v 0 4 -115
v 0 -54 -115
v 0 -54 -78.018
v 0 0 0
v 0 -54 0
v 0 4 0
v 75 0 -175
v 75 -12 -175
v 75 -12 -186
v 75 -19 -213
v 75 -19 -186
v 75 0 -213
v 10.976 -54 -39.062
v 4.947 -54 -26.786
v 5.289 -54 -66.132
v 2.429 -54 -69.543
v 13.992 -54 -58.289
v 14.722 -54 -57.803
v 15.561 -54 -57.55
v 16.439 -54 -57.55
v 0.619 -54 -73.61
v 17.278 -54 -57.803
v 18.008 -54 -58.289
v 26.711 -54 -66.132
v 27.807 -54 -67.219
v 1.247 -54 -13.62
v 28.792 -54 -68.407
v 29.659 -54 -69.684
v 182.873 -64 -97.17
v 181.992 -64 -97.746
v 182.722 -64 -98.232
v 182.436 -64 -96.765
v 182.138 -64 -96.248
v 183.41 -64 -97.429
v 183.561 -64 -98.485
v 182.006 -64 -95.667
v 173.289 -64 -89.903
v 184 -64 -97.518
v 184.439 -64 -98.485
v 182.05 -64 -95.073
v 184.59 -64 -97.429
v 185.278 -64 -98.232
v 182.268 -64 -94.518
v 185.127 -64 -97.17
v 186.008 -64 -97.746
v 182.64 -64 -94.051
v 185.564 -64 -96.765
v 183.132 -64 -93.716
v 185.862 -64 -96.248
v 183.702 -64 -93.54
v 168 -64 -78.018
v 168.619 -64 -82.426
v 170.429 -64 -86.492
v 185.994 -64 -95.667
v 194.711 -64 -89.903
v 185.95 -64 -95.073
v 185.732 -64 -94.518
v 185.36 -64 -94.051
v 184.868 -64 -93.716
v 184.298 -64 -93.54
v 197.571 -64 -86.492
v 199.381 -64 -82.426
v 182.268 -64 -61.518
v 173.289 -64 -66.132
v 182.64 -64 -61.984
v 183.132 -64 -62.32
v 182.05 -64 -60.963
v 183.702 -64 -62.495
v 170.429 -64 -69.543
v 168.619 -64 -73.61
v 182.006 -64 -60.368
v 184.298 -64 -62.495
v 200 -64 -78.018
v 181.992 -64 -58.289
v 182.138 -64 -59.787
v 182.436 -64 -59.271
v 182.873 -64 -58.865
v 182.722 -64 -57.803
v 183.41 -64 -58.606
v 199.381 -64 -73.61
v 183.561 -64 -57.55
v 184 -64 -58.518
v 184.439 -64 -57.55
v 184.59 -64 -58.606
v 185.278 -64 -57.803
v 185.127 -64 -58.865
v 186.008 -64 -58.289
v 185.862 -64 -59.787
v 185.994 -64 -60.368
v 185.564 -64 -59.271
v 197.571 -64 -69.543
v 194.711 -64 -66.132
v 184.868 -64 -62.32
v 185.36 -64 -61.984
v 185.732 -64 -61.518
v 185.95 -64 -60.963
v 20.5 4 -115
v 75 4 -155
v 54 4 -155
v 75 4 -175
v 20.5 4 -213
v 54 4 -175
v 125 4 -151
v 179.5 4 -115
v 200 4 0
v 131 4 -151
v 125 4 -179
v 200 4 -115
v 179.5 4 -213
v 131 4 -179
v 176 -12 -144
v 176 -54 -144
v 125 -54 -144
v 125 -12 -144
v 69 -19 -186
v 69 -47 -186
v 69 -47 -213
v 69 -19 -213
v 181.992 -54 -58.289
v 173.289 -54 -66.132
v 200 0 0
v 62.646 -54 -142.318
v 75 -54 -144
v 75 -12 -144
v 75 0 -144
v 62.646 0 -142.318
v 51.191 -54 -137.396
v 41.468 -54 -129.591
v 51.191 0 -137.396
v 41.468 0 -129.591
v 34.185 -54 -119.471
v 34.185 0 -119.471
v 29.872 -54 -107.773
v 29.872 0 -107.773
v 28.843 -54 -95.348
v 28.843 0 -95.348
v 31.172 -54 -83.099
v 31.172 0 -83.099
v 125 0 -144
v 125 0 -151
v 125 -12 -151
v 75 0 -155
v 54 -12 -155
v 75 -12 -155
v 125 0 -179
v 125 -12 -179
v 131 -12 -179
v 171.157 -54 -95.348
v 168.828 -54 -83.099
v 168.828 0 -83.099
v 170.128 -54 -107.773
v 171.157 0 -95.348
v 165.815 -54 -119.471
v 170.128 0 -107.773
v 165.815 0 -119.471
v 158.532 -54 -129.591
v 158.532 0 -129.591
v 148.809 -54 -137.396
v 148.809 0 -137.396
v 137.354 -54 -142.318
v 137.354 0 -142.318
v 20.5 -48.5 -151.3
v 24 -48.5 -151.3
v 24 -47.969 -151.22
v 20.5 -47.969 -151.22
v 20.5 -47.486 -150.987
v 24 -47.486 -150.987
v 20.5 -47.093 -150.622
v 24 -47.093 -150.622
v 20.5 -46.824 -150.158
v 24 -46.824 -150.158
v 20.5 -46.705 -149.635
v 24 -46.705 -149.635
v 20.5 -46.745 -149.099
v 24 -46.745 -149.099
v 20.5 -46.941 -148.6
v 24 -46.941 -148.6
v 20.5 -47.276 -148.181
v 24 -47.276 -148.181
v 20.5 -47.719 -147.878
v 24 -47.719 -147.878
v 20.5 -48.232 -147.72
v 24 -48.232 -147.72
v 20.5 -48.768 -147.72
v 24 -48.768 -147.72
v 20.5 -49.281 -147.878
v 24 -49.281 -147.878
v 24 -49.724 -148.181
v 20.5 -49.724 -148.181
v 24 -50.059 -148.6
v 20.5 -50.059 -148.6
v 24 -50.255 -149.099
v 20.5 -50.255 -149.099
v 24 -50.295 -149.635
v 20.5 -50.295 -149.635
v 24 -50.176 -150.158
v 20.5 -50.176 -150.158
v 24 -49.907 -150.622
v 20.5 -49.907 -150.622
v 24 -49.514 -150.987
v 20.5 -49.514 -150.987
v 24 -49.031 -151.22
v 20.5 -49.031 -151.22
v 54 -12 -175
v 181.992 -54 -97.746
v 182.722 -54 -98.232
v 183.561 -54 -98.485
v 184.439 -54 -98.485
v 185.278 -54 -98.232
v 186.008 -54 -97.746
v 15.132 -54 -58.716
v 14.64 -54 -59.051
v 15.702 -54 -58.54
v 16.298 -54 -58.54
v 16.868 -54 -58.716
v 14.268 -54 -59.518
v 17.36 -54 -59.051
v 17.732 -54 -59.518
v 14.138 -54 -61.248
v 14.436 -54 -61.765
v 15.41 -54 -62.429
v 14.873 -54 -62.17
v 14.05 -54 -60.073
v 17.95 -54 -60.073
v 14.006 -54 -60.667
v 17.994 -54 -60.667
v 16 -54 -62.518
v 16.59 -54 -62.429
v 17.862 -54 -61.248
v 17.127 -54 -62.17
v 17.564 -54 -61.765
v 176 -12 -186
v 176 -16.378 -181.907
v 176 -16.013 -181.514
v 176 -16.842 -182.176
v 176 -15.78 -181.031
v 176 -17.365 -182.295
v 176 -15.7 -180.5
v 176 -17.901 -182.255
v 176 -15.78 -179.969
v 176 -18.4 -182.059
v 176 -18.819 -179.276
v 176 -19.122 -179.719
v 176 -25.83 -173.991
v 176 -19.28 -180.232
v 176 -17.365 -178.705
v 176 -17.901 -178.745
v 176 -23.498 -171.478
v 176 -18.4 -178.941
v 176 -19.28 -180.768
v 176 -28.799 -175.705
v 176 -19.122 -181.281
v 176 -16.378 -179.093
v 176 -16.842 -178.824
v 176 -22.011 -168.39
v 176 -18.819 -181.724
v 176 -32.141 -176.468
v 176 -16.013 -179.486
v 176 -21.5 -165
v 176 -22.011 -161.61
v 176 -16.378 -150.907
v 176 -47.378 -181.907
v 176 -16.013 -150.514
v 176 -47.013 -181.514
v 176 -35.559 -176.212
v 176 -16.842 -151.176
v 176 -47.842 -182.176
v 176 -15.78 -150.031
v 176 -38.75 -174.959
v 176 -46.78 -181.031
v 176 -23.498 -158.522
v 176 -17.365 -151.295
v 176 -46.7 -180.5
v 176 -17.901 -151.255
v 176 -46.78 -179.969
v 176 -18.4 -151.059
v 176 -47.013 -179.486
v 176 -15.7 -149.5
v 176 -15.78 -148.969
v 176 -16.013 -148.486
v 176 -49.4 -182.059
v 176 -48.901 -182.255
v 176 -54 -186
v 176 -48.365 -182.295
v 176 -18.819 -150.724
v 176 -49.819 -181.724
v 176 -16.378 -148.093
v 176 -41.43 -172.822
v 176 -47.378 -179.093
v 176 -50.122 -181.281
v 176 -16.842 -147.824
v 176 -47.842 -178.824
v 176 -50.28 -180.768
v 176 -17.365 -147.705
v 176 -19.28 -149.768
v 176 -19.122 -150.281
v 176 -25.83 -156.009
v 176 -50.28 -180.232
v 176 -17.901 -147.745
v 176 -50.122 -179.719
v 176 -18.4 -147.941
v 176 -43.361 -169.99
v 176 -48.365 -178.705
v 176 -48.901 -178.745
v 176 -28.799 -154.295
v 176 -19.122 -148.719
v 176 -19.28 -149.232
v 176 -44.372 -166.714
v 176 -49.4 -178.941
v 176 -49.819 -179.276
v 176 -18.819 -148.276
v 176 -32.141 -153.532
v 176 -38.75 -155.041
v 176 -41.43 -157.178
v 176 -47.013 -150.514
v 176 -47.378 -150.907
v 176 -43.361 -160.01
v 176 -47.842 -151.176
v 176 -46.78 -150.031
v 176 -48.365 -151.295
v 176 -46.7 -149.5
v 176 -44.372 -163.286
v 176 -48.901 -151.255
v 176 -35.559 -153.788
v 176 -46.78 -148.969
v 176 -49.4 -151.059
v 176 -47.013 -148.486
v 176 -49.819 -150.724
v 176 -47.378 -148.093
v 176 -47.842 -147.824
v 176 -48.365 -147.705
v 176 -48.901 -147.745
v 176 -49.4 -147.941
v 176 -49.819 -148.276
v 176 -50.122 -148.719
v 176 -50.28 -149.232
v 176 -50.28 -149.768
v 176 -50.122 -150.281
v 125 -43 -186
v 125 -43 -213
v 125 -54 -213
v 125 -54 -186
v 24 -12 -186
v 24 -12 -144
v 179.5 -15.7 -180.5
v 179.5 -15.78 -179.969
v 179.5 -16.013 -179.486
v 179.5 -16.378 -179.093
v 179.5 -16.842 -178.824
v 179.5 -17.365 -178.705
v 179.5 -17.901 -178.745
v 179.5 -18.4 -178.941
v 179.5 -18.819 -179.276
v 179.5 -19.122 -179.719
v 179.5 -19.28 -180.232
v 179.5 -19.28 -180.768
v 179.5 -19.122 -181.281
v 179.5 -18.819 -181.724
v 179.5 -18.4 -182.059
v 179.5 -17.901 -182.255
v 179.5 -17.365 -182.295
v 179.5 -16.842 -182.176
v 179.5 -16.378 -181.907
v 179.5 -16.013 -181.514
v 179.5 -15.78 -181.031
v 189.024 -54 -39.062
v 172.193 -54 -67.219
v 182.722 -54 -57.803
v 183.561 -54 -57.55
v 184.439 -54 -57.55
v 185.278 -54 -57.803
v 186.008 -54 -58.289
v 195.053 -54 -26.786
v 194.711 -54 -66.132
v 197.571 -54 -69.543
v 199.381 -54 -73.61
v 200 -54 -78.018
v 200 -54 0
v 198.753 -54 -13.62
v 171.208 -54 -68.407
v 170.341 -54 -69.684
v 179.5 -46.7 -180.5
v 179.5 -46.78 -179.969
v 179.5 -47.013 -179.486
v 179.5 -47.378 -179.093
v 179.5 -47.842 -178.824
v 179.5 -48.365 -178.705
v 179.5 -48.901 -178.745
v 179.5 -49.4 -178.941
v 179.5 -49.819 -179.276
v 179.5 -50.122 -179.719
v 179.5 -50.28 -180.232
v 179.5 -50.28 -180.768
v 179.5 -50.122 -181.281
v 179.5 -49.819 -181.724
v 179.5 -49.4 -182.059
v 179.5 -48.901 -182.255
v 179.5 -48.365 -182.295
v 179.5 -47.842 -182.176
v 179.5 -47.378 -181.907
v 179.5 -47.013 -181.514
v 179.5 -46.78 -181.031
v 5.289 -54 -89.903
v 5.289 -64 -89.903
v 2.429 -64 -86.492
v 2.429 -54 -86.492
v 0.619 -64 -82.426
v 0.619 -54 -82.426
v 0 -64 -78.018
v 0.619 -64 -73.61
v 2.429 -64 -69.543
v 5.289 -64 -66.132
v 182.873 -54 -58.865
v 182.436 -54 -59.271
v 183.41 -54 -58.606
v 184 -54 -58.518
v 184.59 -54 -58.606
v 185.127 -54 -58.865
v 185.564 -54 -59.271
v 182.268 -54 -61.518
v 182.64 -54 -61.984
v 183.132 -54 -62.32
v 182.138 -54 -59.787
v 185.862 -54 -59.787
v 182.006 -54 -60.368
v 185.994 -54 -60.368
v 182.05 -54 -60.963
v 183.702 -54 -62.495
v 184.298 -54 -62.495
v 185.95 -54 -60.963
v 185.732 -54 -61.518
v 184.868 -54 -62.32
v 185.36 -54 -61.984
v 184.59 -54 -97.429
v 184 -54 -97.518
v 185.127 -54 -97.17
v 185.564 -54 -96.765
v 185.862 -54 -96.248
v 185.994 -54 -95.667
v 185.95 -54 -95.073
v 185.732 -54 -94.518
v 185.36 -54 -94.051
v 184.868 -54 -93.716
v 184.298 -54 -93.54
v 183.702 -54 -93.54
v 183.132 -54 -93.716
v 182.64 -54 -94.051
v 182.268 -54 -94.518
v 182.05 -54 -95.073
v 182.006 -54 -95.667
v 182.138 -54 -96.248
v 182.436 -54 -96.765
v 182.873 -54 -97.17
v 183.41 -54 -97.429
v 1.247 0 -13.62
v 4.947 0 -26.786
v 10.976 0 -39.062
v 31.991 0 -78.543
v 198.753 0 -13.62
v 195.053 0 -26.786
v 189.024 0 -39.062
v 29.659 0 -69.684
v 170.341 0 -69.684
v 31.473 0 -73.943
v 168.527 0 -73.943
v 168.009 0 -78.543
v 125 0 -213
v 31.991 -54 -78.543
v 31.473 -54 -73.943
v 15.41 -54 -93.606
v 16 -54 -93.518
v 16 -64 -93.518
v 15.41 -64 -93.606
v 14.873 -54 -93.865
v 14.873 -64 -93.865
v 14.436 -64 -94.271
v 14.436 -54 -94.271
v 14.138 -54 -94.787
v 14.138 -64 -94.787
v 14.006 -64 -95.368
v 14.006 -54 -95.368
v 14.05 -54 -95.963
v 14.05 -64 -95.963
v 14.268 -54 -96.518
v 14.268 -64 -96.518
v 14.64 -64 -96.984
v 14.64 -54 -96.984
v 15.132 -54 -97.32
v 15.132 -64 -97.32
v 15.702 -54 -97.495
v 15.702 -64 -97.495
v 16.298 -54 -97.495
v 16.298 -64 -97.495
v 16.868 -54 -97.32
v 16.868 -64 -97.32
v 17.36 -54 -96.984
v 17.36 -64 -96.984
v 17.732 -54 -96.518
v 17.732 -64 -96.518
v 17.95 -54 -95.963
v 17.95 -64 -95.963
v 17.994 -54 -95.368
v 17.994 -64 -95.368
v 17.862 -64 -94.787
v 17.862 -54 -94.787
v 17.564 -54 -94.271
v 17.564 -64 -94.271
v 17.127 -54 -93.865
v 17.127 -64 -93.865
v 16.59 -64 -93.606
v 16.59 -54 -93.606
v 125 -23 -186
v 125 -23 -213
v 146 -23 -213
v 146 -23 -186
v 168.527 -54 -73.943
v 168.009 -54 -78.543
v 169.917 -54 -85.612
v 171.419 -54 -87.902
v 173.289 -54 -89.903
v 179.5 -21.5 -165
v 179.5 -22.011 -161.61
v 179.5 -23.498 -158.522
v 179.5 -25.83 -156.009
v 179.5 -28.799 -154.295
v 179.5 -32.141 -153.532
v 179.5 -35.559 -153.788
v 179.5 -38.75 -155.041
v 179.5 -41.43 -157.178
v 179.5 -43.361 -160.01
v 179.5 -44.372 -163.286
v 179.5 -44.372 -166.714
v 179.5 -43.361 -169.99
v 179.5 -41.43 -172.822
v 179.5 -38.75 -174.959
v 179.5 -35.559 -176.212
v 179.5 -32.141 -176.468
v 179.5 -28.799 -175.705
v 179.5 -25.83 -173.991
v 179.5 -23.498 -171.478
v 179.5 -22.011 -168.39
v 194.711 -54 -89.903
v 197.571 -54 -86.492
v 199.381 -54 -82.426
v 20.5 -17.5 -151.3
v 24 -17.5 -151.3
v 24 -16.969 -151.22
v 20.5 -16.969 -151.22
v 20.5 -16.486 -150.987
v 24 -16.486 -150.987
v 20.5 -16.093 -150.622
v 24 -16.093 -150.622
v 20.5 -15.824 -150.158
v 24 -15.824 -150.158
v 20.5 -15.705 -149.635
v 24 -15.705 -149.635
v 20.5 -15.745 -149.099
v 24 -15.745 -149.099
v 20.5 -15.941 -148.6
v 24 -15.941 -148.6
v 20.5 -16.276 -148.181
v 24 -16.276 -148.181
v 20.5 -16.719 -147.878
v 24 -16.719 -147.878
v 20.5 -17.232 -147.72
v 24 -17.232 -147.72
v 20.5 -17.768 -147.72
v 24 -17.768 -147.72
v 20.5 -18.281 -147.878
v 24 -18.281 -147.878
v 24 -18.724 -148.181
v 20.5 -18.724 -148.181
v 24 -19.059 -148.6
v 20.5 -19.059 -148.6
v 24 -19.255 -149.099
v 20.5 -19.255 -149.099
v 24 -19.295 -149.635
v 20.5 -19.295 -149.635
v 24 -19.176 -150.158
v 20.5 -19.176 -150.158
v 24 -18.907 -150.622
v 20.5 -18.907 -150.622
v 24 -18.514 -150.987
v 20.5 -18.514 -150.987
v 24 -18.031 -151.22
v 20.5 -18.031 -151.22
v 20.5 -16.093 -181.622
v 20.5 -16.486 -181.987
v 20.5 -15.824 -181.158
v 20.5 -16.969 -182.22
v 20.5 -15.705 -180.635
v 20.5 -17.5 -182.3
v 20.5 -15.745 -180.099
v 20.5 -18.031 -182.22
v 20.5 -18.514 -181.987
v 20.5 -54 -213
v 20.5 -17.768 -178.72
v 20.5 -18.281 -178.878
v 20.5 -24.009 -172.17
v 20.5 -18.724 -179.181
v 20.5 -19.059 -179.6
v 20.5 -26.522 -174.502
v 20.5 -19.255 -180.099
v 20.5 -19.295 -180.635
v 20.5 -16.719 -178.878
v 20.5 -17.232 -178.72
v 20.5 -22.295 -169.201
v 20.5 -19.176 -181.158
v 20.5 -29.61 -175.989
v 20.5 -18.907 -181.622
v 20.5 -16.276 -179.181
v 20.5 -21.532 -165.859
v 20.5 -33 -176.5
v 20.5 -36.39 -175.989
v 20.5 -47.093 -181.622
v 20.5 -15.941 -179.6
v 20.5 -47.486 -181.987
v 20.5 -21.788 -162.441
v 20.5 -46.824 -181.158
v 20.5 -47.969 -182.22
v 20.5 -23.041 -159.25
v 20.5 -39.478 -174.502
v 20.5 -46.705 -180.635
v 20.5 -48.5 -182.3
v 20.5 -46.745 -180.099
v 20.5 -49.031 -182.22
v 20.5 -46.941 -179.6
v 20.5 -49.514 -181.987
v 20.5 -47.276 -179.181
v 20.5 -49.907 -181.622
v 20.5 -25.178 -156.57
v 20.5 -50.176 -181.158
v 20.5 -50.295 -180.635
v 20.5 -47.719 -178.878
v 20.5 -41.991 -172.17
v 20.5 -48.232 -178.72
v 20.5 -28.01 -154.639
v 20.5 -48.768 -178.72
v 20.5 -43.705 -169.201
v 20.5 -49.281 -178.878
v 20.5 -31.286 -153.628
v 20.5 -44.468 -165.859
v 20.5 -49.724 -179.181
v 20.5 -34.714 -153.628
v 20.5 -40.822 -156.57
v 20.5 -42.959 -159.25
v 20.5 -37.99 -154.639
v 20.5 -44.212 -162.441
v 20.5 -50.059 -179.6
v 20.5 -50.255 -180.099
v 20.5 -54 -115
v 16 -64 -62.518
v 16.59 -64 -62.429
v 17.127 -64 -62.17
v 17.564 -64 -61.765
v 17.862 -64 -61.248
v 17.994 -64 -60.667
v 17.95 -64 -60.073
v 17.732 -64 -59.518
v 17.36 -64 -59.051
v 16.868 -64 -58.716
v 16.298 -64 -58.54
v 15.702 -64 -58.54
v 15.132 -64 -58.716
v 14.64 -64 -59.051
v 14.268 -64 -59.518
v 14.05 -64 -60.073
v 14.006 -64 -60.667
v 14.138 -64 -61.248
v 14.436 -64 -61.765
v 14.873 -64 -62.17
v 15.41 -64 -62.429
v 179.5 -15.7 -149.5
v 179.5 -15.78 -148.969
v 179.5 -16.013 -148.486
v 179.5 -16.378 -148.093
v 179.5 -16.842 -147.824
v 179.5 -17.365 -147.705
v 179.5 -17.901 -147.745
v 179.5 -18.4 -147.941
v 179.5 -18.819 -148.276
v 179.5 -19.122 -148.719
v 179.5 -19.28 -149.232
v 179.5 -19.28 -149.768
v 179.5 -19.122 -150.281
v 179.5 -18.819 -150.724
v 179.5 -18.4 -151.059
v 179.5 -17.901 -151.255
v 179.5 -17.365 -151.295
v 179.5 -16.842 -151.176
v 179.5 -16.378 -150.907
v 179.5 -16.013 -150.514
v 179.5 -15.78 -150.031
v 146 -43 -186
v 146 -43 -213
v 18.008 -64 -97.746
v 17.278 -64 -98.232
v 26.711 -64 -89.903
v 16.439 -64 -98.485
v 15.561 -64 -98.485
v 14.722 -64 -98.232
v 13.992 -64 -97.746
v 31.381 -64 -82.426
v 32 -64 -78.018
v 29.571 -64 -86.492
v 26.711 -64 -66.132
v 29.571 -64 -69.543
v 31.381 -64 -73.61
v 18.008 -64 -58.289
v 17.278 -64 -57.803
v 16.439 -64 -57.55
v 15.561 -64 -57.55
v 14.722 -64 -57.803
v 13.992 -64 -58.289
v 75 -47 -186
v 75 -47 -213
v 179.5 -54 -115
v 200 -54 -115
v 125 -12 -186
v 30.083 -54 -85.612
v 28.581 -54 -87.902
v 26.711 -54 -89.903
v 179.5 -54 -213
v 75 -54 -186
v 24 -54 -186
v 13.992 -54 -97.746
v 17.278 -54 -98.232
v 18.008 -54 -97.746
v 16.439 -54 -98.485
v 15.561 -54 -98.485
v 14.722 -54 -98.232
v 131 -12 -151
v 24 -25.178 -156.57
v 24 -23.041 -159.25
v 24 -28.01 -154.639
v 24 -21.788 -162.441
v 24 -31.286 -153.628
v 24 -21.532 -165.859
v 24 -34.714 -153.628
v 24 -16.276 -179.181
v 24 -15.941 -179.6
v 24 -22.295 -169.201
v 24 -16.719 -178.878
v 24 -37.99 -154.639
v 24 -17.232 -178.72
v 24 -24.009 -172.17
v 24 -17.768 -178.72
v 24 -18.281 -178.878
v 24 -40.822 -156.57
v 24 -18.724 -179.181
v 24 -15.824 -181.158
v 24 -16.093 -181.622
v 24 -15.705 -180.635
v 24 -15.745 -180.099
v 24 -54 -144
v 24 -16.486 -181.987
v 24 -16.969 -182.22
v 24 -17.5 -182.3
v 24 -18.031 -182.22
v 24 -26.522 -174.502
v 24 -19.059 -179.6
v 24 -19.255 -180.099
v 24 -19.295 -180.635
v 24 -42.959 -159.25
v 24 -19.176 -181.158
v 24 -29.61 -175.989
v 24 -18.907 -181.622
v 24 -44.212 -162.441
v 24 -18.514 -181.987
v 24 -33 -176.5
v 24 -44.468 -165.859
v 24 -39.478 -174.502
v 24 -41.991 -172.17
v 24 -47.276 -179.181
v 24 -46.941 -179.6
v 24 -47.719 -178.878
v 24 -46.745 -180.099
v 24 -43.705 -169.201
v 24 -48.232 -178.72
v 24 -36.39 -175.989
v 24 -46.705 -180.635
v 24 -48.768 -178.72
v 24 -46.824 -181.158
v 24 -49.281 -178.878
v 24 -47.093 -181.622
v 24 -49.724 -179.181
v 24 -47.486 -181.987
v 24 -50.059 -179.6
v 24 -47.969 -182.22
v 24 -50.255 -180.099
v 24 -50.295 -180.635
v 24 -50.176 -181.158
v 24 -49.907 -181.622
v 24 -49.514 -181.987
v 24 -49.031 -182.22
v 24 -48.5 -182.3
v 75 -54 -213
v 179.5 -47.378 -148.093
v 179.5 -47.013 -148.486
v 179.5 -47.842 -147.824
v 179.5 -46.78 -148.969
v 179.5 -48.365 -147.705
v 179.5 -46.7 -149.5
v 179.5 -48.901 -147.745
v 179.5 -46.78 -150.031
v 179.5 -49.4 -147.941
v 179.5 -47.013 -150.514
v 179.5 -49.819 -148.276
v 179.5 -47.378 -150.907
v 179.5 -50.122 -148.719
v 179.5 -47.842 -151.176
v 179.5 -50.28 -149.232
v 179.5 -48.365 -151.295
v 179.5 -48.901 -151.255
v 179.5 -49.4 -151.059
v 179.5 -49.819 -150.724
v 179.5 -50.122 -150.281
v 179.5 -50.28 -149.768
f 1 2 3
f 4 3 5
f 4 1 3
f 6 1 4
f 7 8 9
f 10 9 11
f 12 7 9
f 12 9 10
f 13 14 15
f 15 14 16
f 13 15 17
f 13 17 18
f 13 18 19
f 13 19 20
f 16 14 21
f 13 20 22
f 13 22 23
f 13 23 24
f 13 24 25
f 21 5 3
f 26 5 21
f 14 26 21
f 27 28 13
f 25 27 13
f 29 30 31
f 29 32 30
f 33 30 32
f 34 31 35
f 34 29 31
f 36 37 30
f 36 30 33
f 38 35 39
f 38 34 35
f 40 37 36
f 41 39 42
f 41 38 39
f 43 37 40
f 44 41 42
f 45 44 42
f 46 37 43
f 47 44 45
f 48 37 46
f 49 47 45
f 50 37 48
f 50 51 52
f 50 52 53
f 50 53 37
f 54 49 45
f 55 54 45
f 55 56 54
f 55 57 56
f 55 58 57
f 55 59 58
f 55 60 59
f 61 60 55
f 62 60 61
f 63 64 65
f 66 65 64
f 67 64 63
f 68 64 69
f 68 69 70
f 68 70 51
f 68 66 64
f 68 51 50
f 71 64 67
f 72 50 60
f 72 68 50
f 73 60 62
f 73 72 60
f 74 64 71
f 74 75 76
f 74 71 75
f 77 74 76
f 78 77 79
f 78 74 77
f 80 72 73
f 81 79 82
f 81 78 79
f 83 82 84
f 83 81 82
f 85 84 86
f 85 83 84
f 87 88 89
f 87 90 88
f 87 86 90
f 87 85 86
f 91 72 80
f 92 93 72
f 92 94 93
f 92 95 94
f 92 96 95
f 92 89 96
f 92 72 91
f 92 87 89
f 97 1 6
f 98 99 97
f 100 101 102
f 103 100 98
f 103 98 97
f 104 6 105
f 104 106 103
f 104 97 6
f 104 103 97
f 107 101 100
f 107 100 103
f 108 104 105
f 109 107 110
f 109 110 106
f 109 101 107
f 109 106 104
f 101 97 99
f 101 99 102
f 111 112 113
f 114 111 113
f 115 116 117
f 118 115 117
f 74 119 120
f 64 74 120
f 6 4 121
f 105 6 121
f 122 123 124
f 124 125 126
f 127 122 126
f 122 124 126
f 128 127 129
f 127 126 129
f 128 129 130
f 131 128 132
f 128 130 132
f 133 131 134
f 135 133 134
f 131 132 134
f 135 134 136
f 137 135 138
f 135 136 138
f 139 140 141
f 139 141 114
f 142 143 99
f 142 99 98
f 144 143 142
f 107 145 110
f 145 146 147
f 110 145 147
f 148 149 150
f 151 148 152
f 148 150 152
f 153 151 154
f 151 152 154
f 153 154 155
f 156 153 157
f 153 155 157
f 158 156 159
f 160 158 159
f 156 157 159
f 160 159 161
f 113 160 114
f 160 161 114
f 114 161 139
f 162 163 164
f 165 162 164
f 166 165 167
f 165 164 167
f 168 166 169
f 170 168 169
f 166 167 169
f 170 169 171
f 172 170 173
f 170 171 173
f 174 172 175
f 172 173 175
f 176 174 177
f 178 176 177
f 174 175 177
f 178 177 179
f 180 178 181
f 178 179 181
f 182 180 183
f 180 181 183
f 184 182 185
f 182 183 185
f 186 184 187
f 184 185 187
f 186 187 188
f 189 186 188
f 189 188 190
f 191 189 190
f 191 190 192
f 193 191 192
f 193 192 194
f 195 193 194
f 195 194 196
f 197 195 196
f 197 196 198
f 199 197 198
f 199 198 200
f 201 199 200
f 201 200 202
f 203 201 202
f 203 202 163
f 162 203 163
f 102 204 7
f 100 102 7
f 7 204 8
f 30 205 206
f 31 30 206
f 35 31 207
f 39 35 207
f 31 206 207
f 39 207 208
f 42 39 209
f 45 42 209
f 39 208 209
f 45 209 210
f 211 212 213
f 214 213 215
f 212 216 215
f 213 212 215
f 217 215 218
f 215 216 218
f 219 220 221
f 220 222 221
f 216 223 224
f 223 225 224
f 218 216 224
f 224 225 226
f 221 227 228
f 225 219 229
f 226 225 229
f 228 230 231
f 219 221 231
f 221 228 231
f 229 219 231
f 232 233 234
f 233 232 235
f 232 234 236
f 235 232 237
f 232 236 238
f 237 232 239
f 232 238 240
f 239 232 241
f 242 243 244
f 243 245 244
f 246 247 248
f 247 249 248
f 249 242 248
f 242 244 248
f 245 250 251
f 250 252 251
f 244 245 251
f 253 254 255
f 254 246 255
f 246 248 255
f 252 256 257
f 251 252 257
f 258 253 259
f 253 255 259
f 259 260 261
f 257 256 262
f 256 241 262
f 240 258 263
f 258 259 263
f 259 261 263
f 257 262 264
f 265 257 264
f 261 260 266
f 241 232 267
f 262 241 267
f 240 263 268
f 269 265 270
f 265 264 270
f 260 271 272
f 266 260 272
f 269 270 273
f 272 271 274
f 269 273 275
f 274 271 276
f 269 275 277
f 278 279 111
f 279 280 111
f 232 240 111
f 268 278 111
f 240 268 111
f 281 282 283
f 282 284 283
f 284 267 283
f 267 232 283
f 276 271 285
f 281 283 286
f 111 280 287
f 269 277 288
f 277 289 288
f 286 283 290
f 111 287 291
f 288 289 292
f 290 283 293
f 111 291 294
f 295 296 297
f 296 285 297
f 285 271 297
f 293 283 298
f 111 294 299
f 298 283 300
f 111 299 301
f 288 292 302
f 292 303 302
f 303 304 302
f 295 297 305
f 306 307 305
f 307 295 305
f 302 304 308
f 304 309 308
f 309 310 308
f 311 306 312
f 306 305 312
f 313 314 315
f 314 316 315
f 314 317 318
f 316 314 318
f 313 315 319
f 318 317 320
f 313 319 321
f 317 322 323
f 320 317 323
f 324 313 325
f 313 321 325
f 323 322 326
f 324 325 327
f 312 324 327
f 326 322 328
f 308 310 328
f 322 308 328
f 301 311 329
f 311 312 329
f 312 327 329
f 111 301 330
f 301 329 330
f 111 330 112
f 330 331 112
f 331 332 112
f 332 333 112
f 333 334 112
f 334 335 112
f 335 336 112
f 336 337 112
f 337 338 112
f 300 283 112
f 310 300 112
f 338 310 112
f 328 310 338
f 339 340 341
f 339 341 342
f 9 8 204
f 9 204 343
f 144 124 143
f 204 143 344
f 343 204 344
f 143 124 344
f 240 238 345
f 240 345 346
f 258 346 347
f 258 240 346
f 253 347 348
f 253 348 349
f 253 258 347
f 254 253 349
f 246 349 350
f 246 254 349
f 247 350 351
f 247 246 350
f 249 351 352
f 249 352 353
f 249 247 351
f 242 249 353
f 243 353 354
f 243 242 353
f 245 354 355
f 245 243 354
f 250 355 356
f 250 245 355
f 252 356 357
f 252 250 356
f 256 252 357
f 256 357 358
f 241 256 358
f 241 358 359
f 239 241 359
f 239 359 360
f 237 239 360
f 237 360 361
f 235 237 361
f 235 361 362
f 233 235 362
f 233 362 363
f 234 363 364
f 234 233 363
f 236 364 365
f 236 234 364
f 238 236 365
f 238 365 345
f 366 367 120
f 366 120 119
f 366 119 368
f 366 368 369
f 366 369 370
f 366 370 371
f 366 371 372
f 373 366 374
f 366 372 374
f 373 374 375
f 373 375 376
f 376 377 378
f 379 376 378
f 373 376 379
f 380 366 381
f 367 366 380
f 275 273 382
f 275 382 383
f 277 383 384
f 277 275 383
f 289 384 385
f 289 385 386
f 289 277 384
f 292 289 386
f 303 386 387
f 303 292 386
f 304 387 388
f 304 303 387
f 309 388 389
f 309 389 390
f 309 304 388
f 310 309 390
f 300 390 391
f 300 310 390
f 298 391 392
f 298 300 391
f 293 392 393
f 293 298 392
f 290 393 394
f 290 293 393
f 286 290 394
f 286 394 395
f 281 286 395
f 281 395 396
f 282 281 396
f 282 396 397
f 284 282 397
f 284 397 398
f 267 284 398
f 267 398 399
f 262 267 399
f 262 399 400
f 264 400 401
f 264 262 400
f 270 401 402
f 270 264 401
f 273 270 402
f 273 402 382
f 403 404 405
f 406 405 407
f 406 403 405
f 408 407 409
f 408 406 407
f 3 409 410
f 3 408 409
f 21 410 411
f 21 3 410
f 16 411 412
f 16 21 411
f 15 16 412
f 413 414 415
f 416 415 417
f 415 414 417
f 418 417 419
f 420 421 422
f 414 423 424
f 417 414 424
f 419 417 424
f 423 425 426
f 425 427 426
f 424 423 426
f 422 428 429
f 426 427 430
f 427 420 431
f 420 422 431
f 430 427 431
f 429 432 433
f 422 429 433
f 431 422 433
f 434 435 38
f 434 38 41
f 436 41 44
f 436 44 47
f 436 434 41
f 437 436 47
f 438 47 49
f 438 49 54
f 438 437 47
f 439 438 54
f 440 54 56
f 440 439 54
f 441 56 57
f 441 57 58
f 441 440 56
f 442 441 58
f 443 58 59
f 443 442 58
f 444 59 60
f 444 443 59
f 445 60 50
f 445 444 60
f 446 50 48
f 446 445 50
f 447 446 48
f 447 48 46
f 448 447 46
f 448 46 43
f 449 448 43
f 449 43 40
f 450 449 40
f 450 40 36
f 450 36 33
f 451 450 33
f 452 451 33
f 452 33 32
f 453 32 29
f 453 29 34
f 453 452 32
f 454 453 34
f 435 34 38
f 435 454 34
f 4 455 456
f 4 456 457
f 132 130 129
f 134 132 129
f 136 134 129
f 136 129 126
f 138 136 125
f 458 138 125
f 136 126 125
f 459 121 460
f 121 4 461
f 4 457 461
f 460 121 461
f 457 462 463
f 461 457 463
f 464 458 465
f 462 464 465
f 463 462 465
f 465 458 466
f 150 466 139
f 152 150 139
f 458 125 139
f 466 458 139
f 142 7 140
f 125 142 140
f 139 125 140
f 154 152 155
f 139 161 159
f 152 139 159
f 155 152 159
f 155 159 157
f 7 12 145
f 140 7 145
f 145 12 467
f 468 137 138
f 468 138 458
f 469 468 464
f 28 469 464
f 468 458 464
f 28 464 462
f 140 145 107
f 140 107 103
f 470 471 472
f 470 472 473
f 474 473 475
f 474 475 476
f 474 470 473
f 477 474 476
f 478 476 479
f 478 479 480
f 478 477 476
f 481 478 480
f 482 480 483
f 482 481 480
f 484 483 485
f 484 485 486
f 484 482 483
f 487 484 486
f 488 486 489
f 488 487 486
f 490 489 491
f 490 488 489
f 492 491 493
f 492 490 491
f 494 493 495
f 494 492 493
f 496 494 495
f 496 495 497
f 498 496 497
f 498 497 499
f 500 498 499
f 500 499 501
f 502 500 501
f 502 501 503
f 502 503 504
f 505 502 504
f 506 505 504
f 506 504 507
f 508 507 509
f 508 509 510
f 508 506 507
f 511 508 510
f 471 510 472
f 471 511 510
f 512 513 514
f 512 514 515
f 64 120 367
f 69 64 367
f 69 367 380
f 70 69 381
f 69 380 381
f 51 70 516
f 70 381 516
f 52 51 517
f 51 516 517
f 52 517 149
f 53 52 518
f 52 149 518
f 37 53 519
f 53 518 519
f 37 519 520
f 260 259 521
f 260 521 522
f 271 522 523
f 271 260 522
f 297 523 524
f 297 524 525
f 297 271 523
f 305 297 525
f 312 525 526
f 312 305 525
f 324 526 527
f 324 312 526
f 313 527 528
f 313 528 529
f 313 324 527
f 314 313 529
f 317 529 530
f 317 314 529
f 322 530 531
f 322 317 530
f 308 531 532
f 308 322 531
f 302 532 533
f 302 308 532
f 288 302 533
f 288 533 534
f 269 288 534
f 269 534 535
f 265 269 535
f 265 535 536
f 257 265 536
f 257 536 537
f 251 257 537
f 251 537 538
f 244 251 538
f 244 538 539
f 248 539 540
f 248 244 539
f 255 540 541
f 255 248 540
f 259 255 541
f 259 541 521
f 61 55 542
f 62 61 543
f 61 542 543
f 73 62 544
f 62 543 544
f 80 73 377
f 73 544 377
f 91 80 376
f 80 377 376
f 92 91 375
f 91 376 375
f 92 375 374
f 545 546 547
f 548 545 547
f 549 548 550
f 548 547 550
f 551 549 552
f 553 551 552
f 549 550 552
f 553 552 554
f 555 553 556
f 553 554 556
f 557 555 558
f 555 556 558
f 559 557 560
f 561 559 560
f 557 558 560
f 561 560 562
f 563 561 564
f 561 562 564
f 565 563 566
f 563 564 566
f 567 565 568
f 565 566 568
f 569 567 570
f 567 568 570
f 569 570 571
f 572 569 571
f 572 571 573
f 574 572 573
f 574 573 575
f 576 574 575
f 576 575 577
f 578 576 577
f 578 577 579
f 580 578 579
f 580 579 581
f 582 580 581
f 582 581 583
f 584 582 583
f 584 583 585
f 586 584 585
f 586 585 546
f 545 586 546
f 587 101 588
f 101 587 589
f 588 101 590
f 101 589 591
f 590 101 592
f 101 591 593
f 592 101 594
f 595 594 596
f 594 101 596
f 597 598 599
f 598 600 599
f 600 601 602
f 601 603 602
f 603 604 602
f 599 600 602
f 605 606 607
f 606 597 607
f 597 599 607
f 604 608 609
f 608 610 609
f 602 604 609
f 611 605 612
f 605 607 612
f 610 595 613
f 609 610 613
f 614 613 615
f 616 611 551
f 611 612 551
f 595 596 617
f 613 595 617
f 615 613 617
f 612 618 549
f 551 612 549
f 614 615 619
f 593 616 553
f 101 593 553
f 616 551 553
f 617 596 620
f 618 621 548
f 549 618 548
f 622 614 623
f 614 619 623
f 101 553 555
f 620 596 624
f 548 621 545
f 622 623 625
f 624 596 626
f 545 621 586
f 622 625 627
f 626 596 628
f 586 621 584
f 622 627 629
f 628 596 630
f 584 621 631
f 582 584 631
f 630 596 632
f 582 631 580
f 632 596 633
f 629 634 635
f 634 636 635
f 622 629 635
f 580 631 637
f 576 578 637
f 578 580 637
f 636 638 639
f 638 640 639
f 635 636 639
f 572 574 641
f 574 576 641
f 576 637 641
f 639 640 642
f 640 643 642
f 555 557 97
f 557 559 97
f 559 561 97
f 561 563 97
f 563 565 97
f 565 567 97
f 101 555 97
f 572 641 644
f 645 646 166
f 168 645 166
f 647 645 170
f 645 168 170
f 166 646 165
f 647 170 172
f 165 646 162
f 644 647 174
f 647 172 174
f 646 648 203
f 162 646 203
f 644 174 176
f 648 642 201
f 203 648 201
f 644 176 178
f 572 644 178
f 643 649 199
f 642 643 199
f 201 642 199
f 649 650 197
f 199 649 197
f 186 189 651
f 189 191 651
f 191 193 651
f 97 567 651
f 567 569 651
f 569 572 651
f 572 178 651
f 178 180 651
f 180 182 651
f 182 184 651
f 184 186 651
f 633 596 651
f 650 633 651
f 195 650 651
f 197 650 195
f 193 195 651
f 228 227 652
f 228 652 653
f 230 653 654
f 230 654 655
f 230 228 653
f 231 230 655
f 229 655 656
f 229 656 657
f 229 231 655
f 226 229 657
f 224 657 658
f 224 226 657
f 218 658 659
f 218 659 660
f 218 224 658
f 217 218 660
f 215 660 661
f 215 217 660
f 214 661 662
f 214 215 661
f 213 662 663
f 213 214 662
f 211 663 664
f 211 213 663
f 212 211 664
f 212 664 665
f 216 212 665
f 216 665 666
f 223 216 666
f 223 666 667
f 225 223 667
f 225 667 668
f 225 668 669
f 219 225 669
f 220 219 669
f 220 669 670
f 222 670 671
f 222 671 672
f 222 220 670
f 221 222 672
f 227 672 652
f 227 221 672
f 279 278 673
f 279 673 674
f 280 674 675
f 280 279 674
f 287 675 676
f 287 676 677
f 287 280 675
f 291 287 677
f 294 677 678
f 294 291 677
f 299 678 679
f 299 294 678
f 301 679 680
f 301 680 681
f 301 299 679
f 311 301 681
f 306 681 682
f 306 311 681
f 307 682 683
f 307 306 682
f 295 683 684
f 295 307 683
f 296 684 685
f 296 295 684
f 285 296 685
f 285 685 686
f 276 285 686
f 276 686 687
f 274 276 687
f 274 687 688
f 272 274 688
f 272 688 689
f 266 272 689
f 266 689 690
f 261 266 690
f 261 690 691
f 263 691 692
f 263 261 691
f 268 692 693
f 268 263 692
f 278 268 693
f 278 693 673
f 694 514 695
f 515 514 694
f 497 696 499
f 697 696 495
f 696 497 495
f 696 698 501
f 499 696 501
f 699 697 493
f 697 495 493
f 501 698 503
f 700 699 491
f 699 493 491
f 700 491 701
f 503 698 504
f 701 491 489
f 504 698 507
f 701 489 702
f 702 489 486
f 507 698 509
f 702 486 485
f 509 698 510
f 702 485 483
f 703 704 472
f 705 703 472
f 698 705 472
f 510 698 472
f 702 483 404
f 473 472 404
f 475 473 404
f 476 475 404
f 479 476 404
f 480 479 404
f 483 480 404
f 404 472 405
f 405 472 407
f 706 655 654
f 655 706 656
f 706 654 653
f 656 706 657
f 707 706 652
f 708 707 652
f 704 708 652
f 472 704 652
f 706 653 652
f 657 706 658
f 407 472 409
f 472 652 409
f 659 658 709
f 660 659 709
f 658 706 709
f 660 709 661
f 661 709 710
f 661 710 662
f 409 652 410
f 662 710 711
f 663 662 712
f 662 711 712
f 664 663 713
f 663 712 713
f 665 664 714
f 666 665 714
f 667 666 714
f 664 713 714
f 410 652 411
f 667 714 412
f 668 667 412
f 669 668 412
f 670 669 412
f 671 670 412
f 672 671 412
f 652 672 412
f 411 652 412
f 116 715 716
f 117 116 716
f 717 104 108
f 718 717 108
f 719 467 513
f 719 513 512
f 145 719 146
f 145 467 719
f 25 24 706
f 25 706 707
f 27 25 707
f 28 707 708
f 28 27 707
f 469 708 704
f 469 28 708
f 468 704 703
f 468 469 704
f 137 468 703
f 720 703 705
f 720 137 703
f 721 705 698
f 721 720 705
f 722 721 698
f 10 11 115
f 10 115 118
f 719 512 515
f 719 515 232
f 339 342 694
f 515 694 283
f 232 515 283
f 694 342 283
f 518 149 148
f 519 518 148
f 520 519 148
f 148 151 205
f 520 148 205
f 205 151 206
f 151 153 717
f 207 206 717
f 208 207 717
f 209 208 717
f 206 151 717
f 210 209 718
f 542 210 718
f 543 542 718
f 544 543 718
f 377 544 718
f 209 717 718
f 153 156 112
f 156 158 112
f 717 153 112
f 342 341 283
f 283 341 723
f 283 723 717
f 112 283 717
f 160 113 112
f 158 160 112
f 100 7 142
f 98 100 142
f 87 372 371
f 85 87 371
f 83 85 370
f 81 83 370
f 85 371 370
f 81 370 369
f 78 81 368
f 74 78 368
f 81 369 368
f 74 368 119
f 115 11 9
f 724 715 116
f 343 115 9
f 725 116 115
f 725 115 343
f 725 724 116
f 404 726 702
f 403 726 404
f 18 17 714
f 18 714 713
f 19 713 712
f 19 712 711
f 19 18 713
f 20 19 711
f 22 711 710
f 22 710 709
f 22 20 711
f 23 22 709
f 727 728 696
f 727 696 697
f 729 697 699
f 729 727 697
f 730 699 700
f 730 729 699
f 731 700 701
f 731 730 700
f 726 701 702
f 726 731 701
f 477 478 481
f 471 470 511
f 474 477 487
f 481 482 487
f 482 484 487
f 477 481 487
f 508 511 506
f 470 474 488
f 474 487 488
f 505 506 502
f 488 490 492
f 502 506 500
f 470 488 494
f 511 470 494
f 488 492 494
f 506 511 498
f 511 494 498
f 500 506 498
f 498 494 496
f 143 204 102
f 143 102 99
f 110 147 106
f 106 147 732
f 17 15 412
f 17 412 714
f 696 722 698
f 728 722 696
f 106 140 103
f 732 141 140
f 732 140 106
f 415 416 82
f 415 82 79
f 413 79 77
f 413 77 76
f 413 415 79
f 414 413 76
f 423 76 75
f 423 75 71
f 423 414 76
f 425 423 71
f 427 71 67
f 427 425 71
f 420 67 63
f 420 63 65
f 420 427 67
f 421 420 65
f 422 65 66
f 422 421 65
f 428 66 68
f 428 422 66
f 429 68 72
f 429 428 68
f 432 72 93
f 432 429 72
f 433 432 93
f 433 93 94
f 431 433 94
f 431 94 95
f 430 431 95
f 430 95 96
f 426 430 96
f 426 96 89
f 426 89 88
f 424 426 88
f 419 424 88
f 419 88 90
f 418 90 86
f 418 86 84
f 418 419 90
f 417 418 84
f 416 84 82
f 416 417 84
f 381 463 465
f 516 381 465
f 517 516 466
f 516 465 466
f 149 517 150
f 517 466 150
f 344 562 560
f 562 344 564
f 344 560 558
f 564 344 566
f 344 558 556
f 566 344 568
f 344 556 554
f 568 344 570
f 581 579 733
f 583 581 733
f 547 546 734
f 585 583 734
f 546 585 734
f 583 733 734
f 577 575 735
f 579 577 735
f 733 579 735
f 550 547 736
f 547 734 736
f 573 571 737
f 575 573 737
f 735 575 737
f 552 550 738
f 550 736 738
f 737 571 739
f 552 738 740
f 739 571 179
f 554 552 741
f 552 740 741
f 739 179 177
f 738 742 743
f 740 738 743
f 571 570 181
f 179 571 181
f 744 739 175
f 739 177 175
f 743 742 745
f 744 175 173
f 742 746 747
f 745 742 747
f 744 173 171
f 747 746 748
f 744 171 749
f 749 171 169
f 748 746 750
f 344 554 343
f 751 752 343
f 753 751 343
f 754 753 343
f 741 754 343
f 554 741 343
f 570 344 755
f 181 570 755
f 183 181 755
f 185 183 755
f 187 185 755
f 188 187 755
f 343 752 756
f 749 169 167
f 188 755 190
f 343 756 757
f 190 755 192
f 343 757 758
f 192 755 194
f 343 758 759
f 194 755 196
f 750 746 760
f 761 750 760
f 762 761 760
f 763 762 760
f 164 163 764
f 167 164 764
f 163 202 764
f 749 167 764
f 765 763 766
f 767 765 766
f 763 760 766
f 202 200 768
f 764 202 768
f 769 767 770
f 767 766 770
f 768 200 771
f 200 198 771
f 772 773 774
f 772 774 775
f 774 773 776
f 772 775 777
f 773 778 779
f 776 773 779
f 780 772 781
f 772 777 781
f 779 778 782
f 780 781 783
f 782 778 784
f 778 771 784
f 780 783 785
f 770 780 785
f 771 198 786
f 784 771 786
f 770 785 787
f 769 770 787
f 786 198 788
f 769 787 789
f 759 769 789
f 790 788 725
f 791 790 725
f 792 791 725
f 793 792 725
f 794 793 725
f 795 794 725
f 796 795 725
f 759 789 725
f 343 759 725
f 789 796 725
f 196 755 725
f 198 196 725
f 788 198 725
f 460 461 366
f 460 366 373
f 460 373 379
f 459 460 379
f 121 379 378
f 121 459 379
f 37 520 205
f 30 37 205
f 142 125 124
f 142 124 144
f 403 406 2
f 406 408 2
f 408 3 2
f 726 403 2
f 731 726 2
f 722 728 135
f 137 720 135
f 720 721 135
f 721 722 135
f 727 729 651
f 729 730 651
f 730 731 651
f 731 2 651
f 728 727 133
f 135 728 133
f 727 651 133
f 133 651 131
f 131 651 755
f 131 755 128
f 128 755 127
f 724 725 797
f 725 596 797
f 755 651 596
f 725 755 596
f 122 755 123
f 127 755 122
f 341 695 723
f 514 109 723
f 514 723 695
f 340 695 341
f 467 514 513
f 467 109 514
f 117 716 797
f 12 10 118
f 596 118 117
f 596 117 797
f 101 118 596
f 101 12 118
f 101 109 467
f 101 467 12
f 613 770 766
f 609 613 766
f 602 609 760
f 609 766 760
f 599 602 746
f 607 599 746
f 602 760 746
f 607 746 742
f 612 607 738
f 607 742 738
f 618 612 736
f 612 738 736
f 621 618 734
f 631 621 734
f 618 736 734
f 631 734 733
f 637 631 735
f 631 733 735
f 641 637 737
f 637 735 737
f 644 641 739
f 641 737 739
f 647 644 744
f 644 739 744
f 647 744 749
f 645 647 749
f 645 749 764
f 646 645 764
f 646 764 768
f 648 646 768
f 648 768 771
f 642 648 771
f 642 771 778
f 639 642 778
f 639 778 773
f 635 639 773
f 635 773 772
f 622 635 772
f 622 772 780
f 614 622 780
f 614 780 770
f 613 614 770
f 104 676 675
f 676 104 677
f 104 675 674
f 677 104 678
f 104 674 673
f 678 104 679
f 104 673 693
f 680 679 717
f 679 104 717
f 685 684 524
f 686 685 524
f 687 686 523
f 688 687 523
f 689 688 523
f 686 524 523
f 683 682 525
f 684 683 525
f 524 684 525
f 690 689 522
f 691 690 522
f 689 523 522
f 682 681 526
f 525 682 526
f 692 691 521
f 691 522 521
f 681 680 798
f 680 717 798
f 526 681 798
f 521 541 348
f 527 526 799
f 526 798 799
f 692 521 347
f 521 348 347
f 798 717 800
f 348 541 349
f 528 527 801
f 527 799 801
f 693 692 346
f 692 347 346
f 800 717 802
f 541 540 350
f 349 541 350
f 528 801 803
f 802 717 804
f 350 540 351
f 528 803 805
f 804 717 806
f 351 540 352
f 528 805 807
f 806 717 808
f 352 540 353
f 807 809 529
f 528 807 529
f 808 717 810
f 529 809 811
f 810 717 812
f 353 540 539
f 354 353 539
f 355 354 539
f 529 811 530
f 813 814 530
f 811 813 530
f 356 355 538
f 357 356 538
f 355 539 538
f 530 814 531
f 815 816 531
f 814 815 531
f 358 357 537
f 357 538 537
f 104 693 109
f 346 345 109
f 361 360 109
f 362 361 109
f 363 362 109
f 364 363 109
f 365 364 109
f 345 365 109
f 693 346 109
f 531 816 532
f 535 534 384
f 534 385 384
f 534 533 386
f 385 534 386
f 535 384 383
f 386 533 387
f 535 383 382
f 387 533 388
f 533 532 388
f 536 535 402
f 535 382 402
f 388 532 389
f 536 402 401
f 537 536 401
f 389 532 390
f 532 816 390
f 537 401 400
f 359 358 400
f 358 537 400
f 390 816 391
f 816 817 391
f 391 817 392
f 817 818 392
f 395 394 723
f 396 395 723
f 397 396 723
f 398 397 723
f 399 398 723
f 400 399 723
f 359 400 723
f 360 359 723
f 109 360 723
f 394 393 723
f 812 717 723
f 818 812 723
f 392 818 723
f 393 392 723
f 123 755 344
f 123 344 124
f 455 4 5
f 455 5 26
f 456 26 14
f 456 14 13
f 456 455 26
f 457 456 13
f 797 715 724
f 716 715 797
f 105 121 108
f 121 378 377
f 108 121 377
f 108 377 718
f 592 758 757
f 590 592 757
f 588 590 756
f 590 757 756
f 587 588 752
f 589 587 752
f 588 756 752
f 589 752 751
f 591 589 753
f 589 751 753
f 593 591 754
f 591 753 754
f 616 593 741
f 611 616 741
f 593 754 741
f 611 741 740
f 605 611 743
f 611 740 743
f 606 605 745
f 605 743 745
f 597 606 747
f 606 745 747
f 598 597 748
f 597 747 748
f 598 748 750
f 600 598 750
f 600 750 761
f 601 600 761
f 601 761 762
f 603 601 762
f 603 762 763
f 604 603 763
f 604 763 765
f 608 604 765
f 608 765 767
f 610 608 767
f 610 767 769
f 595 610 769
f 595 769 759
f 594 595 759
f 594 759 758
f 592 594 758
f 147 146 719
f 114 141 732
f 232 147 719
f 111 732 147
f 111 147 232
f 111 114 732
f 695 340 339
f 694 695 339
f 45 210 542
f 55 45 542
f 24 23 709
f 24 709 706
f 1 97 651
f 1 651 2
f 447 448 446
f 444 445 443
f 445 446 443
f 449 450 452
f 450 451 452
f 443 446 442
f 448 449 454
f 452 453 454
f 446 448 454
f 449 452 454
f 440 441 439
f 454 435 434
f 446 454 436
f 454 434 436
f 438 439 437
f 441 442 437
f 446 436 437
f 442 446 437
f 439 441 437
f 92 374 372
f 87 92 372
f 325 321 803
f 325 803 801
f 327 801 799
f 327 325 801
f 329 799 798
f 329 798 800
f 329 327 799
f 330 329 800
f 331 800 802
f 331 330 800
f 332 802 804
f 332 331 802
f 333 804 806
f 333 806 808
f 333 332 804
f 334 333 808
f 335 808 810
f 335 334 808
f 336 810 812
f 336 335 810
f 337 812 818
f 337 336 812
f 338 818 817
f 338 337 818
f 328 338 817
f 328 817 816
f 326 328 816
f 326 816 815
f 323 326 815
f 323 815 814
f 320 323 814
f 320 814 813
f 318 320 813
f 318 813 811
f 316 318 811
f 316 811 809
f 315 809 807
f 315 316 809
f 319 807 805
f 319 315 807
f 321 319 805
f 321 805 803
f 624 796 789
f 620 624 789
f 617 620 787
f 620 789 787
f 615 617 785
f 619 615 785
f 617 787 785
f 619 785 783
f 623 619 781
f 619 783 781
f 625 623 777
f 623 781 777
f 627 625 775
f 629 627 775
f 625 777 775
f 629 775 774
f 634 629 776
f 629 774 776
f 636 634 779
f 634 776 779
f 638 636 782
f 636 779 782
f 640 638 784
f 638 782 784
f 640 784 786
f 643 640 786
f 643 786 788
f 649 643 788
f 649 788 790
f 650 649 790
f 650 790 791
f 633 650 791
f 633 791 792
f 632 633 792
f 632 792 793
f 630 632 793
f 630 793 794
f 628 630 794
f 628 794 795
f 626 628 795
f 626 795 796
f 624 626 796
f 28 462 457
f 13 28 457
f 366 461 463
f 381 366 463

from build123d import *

# Parameters (mm, degrees)
SKETCH_1_W           = 200
SKETCH_1_H           = 213
EXTRUDE_1_DEPTH      = 4
EXTRUDE_2_DEPTH      = 54
CUT_EXTRUDE_2_DEPTH  = 298.880848663
CUT_EXTRUDE_3_DEPTH  = 42
SKETCH_7_R           = 1.8
SKETCH_7_R_2         = 11.5
CUT_EXTRUDE_4_DEPTH  = 282.53330176
MIRROR_START         = 176
MIRROR_1_OUTLINE_R   = 1.8
MIRROR_1_OUTLINE_R_2 = 11.5
MIRROR_1_DEPTH       = 3.5
SKETCH_8_W           = 27
SKETCH_8_H           = 28
CUT_EXTRUDE_5_DEPTH  = 6
SKETCH_9_W           = 27
SKETCH_9_H           = 20
CUT_EXTRUDE_6_DEPTH  = 21
CUT_EXTRUDE_START    = -54
CUT_EXTRUDE_7_DEPTH  = 54
SKETCH_12_R          = 2
EXTRUDE_3_DEPTH      = 10
SKETCH_14_W          = 21
SKETCH_14_H          = 20
CUT_EXTRUDE_8_DEPTH  = 297.770955452
SKETCH_15_W          = 6
SKETCH_15_H          = 28
CUT_EXTRUDE_9_DEPTH  = 297.770955452


# Read off the part's stored shape, not the designer's step: 镜向1
with BuildPart() as part:
    # 草图1 → 凸台-拉伸1 (new body)
    with BuildSketch(Plane(origin=(0, 0, 0), x_dir=(1, 0, 0), z_dir=(0, 1, 0))):
        with Locations((100, 106.5)):
            Rectangle(SKETCH_1_W, SKETCH_1_H)
    extrude(amount=EXTRUDE_1_DEPTH)

    # 草图1<4> → 凸台-拉伸2 (add)
    with BuildSketch(Plane(origin=(0, 0, 0), x_dir=(1, 0, 0), z_dir=(0, 1, 0))):
        with BuildLine():
            Line((0, 213), (0, 0))
            ThreePointArc((0, 0), (21.966991411, 53.033008589), (75, 75))
            Line((75, 75), (75, 213))
            Line((75, 213), (0, 213))
        make_face()
        with BuildLine():
            Line((125, 213), (125, 75))
            ThreePointArc((125, 75), (178.033008589, 53.033008589), (200, 0))
            Line((200, 0), (200, 213))
            Line((200, 213), (125, 213))
        make_face()
    extrude(amount=-EXTRUDE_2_DEPTH)

    # 草图3 → 切除-拉伸2 (cut, through all)
    with BuildSketch(Plane.XZ.offset(54)):
        Polygon((20.5, -186), (20.5, -165), (20.5, -144), (20.5, -115), (0, -115), (0, -213), (20.5, -213), align=None)
        Polygon((179.5, -115), (200, -115), (200, -213), (179.5, -213), (179.5, -165), align=None)
    extrude(amount=-CUT_EXTRUDE_2_DEPTH, mode=Mode.SUBTRACT)

    # 草图5 → 切除-拉伸3 (cut)
    with BuildSketch(Plane.XZ.offset(54)):
        Polygon((176, -164), (176, -144), (125, -144), (125, -186), (176, -186), align=None)
        Polygon((24, -164), (24, -144), (75, -144), (75, -186), (24, -186), align=None)
    extrude(amount=-CUT_EXTRUDE_3_DEPTH, mode=Mode.SUBTRACT)

    # 草图7 → 切除-拉伸4 (cut, through all)
    with BuildSketch(Plane(origin=(24, 0, 0), x_dir=(0, 0, -1), z_dir=(1, 0, 0))):
        with Locations((180.5, -17.5)):
            Circle(SKETCH_7_R)
        with Locations((149.5, -17.5)):
            Circle(SKETCH_7_R)
        with Locations((165, -33)):
            Circle(SKETCH_7_R_2)
        with Locations((180.5, -48.5)):
            Circle(SKETCH_7_R)
        with Locations((149.5, -48.5)):
            Circle(SKETCH_7_R)
    extrude(amount=-CUT_EXTRUDE_4_DEPTH, mode=Mode.SUBTRACT)

    # 镜向1 outline → 镜向1 (cut)
    with BuildSketch(Plane.YZ.offset(MIRROR_START)):
        with Locations((-17.5, -180.5)):
            Circle(MIRROR_1_OUTLINE_R)
        with Locations((-17.5, -149.5)):
            Circle(MIRROR_1_OUTLINE_R)
        with Locations((-33, -165)):
            Circle(MIRROR_1_OUTLINE_R_2)
        with Locations((-48.5, -180.5)):
            Circle(MIRROR_1_OUTLINE_R)
        with Locations((-48.5, -149.5)):
            Circle(MIRROR_1_OUTLINE_R)
    extrude(amount=MIRROR_1_DEPTH, mode=Mode.SUBTRACT)

    # 草图8 → 切除-拉伸5 (cut)
    with BuildSketch(Plane(origin=(75, 0, 0), x_dir=(0, 0, -1), z_dir=(1, 0, 0))):
        with Locations((199.5, -33)):
            Rectangle(SKETCH_8_W, SKETCH_8_H)
    extrude(amount=-CUT_EXTRUDE_5_DEPTH, mode=Mode.SUBTRACT)

    # 草图9 → 切除-拉伸6 (cut)
    with BuildSketch(Plane.ZY.offset(-125)):
        with Locations((-199.5, -33)):
            Rectangle(SKETCH_9_W, SKETCH_9_H)
    extrude(amount=-CUT_EXTRUDE_6_DEPTH, mode=Mode.SUBTRACT)

    # 草图11 → 切除-拉伸7 (cut)
    with BuildSketch(Plane.XZ.offset(54).offset(CUT_EXTRUDE_START)):
        with BuildLine():
            Line((29.658534166, -69.684244774), (10.975621098, -39.0625))
            ThreePointArc((10.975621098, -39.0625), (38.289562111, -65.401404801), (75, -75))
            Line((75, -75), (75, -144))
            ThreePointArc((75, -144), (37.483837038, -124.777752739), (31.171635941, -83.099060455))
            ThreePointArc((31.171635941, -83.099060455), (31.899182276, -76.224256342), (29.658534166, -69.684244774))
        make_face()
        with BuildLine():
            Line((125, -144), (125, -75))
            ThreePointArc((125, -75), (161.710437889, -65.401404801), (189.024378902, -39.0625))
            Line((189.024378902, -39.0625), (170.341465834, -69.684244774))
            ThreePointArc((170.341465834, -69.684244774), (168.100817724, -76.224256342), (168.828364059, -83.099060455))
            ThreePointArc((168.828364059, -83.099060455), (162.516162962, -124.777752739), (125, -144))
        make_face()
    extrude(amount=CUT_EXTRUDE_7_DEPTH, mode=Mode.SUBTRACT)

    # 草图12 → 凸台-拉伸3 (add)
    # profile 1 of 2: a face of its own
    with BuildSketch(Plane.XZ.offset(54)):
        with BuildLine():
            Line((18.008349917, -58.289006678), (26.711199556, -66.131863821))
            ThreePointArc((26.711199556, -66.131863821), (32, -78.017578107), (26.711199556, -89.903292393))
            Line((26.711199556, -89.903292393), (18.008349917, -97.746149535))
            ThreePointArc((18.008349917, -97.746149535), (16, -98.517578107), (13.991650083, -97.746149535))
            Line((13.991650083, -97.746149535), (5.288800444, -89.903292393))
            ThreePointArc((5.288800444, -89.903292393), (0, -78.017578107), (5.288800444, -66.131863821))
            Line((5.288800444, -66.131863821), (13.991650083, -58.289006678))
            ThreePointArc((13.991650083, -58.289006678), (16, -57.517578107), (18.008349917, -58.289006678))
        make_face()
        with Locations(Location((16, -60.517578107, 0), (0, 0, 270))):
            Circle(SKETCH_12_R, mode=Mode.SUBTRACT)
        with Locations(Location((16, -95.517578107, 0), (0, 0, 90))):
            Circle(SKETCH_12_R, mode=Mode.SUBTRACT)
    # profile 2 of 2: a face of its own
    with BuildSketch(Plane.XZ.offset(54)):
        with BuildLine():
            Line((186.008349917, -97.746149535), (194.711199556, -89.903292393))
            ThreePointArc((194.711199556, -89.903292393), (200, -78.017578107), (194.711199556, -66.131863821))
            Line((194.711199556, -66.131863821), (186.008349917, -58.289006678))
            ThreePointArc((186.008349917, -58.289006678), (184, -57.517578107), (181.991650083, -58.289006678))
            Line((181.991650083, -58.289006678), (173.288800444, -66.131863821))
            ThreePointArc((173.288800444, -66.131863821), (168, -78.017578107), (173.288800444, -89.903292393))
            Line((173.288800444, -89.903292393), (181.991650083, -97.746149535))
            ThreePointArc((181.991650083, -97.746149535), (184, -98.517578107), (186.008349917, -97.746149535))
        make_face()
        with Locations(Location((184, -95.517578107, 0), (0, 0, 270))):
            Circle(SKETCH_12_R, mode=Mode.SUBTRACT)
        with Locations(Location((184, -60.517578107, 0), (0, 0, 90))):
            Circle(SKETCH_12_R, mode=Mode.SUBTRACT)
    extrude(amount=EXTRUDE_3_DEPTH)

    # 草图14 → 切除-拉伸8 (cut, through all)
    with BuildSketch(Plane.XZ.offset(12)):
        with Locations((64.5, -165)):
            Rectangle(SKETCH_14_W, SKETCH_14_H)
    extrude(amount=-CUT_EXTRUDE_8_DEPTH, mode=Mode.SUBTRACT)

    # 草图15 → 切除-拉伸9 (cut, through all)
    with BuildSketch(Plane.XZ.offset(12)):
        with Locations((128, -165)):
            Rectangle(SKETCH_15_W, SKETCH_15_H)
    extrude(amount=-CUT_EXTRUDE_9_DEPTH, mode=Mode.SUBTRACT)


solid = part.part
